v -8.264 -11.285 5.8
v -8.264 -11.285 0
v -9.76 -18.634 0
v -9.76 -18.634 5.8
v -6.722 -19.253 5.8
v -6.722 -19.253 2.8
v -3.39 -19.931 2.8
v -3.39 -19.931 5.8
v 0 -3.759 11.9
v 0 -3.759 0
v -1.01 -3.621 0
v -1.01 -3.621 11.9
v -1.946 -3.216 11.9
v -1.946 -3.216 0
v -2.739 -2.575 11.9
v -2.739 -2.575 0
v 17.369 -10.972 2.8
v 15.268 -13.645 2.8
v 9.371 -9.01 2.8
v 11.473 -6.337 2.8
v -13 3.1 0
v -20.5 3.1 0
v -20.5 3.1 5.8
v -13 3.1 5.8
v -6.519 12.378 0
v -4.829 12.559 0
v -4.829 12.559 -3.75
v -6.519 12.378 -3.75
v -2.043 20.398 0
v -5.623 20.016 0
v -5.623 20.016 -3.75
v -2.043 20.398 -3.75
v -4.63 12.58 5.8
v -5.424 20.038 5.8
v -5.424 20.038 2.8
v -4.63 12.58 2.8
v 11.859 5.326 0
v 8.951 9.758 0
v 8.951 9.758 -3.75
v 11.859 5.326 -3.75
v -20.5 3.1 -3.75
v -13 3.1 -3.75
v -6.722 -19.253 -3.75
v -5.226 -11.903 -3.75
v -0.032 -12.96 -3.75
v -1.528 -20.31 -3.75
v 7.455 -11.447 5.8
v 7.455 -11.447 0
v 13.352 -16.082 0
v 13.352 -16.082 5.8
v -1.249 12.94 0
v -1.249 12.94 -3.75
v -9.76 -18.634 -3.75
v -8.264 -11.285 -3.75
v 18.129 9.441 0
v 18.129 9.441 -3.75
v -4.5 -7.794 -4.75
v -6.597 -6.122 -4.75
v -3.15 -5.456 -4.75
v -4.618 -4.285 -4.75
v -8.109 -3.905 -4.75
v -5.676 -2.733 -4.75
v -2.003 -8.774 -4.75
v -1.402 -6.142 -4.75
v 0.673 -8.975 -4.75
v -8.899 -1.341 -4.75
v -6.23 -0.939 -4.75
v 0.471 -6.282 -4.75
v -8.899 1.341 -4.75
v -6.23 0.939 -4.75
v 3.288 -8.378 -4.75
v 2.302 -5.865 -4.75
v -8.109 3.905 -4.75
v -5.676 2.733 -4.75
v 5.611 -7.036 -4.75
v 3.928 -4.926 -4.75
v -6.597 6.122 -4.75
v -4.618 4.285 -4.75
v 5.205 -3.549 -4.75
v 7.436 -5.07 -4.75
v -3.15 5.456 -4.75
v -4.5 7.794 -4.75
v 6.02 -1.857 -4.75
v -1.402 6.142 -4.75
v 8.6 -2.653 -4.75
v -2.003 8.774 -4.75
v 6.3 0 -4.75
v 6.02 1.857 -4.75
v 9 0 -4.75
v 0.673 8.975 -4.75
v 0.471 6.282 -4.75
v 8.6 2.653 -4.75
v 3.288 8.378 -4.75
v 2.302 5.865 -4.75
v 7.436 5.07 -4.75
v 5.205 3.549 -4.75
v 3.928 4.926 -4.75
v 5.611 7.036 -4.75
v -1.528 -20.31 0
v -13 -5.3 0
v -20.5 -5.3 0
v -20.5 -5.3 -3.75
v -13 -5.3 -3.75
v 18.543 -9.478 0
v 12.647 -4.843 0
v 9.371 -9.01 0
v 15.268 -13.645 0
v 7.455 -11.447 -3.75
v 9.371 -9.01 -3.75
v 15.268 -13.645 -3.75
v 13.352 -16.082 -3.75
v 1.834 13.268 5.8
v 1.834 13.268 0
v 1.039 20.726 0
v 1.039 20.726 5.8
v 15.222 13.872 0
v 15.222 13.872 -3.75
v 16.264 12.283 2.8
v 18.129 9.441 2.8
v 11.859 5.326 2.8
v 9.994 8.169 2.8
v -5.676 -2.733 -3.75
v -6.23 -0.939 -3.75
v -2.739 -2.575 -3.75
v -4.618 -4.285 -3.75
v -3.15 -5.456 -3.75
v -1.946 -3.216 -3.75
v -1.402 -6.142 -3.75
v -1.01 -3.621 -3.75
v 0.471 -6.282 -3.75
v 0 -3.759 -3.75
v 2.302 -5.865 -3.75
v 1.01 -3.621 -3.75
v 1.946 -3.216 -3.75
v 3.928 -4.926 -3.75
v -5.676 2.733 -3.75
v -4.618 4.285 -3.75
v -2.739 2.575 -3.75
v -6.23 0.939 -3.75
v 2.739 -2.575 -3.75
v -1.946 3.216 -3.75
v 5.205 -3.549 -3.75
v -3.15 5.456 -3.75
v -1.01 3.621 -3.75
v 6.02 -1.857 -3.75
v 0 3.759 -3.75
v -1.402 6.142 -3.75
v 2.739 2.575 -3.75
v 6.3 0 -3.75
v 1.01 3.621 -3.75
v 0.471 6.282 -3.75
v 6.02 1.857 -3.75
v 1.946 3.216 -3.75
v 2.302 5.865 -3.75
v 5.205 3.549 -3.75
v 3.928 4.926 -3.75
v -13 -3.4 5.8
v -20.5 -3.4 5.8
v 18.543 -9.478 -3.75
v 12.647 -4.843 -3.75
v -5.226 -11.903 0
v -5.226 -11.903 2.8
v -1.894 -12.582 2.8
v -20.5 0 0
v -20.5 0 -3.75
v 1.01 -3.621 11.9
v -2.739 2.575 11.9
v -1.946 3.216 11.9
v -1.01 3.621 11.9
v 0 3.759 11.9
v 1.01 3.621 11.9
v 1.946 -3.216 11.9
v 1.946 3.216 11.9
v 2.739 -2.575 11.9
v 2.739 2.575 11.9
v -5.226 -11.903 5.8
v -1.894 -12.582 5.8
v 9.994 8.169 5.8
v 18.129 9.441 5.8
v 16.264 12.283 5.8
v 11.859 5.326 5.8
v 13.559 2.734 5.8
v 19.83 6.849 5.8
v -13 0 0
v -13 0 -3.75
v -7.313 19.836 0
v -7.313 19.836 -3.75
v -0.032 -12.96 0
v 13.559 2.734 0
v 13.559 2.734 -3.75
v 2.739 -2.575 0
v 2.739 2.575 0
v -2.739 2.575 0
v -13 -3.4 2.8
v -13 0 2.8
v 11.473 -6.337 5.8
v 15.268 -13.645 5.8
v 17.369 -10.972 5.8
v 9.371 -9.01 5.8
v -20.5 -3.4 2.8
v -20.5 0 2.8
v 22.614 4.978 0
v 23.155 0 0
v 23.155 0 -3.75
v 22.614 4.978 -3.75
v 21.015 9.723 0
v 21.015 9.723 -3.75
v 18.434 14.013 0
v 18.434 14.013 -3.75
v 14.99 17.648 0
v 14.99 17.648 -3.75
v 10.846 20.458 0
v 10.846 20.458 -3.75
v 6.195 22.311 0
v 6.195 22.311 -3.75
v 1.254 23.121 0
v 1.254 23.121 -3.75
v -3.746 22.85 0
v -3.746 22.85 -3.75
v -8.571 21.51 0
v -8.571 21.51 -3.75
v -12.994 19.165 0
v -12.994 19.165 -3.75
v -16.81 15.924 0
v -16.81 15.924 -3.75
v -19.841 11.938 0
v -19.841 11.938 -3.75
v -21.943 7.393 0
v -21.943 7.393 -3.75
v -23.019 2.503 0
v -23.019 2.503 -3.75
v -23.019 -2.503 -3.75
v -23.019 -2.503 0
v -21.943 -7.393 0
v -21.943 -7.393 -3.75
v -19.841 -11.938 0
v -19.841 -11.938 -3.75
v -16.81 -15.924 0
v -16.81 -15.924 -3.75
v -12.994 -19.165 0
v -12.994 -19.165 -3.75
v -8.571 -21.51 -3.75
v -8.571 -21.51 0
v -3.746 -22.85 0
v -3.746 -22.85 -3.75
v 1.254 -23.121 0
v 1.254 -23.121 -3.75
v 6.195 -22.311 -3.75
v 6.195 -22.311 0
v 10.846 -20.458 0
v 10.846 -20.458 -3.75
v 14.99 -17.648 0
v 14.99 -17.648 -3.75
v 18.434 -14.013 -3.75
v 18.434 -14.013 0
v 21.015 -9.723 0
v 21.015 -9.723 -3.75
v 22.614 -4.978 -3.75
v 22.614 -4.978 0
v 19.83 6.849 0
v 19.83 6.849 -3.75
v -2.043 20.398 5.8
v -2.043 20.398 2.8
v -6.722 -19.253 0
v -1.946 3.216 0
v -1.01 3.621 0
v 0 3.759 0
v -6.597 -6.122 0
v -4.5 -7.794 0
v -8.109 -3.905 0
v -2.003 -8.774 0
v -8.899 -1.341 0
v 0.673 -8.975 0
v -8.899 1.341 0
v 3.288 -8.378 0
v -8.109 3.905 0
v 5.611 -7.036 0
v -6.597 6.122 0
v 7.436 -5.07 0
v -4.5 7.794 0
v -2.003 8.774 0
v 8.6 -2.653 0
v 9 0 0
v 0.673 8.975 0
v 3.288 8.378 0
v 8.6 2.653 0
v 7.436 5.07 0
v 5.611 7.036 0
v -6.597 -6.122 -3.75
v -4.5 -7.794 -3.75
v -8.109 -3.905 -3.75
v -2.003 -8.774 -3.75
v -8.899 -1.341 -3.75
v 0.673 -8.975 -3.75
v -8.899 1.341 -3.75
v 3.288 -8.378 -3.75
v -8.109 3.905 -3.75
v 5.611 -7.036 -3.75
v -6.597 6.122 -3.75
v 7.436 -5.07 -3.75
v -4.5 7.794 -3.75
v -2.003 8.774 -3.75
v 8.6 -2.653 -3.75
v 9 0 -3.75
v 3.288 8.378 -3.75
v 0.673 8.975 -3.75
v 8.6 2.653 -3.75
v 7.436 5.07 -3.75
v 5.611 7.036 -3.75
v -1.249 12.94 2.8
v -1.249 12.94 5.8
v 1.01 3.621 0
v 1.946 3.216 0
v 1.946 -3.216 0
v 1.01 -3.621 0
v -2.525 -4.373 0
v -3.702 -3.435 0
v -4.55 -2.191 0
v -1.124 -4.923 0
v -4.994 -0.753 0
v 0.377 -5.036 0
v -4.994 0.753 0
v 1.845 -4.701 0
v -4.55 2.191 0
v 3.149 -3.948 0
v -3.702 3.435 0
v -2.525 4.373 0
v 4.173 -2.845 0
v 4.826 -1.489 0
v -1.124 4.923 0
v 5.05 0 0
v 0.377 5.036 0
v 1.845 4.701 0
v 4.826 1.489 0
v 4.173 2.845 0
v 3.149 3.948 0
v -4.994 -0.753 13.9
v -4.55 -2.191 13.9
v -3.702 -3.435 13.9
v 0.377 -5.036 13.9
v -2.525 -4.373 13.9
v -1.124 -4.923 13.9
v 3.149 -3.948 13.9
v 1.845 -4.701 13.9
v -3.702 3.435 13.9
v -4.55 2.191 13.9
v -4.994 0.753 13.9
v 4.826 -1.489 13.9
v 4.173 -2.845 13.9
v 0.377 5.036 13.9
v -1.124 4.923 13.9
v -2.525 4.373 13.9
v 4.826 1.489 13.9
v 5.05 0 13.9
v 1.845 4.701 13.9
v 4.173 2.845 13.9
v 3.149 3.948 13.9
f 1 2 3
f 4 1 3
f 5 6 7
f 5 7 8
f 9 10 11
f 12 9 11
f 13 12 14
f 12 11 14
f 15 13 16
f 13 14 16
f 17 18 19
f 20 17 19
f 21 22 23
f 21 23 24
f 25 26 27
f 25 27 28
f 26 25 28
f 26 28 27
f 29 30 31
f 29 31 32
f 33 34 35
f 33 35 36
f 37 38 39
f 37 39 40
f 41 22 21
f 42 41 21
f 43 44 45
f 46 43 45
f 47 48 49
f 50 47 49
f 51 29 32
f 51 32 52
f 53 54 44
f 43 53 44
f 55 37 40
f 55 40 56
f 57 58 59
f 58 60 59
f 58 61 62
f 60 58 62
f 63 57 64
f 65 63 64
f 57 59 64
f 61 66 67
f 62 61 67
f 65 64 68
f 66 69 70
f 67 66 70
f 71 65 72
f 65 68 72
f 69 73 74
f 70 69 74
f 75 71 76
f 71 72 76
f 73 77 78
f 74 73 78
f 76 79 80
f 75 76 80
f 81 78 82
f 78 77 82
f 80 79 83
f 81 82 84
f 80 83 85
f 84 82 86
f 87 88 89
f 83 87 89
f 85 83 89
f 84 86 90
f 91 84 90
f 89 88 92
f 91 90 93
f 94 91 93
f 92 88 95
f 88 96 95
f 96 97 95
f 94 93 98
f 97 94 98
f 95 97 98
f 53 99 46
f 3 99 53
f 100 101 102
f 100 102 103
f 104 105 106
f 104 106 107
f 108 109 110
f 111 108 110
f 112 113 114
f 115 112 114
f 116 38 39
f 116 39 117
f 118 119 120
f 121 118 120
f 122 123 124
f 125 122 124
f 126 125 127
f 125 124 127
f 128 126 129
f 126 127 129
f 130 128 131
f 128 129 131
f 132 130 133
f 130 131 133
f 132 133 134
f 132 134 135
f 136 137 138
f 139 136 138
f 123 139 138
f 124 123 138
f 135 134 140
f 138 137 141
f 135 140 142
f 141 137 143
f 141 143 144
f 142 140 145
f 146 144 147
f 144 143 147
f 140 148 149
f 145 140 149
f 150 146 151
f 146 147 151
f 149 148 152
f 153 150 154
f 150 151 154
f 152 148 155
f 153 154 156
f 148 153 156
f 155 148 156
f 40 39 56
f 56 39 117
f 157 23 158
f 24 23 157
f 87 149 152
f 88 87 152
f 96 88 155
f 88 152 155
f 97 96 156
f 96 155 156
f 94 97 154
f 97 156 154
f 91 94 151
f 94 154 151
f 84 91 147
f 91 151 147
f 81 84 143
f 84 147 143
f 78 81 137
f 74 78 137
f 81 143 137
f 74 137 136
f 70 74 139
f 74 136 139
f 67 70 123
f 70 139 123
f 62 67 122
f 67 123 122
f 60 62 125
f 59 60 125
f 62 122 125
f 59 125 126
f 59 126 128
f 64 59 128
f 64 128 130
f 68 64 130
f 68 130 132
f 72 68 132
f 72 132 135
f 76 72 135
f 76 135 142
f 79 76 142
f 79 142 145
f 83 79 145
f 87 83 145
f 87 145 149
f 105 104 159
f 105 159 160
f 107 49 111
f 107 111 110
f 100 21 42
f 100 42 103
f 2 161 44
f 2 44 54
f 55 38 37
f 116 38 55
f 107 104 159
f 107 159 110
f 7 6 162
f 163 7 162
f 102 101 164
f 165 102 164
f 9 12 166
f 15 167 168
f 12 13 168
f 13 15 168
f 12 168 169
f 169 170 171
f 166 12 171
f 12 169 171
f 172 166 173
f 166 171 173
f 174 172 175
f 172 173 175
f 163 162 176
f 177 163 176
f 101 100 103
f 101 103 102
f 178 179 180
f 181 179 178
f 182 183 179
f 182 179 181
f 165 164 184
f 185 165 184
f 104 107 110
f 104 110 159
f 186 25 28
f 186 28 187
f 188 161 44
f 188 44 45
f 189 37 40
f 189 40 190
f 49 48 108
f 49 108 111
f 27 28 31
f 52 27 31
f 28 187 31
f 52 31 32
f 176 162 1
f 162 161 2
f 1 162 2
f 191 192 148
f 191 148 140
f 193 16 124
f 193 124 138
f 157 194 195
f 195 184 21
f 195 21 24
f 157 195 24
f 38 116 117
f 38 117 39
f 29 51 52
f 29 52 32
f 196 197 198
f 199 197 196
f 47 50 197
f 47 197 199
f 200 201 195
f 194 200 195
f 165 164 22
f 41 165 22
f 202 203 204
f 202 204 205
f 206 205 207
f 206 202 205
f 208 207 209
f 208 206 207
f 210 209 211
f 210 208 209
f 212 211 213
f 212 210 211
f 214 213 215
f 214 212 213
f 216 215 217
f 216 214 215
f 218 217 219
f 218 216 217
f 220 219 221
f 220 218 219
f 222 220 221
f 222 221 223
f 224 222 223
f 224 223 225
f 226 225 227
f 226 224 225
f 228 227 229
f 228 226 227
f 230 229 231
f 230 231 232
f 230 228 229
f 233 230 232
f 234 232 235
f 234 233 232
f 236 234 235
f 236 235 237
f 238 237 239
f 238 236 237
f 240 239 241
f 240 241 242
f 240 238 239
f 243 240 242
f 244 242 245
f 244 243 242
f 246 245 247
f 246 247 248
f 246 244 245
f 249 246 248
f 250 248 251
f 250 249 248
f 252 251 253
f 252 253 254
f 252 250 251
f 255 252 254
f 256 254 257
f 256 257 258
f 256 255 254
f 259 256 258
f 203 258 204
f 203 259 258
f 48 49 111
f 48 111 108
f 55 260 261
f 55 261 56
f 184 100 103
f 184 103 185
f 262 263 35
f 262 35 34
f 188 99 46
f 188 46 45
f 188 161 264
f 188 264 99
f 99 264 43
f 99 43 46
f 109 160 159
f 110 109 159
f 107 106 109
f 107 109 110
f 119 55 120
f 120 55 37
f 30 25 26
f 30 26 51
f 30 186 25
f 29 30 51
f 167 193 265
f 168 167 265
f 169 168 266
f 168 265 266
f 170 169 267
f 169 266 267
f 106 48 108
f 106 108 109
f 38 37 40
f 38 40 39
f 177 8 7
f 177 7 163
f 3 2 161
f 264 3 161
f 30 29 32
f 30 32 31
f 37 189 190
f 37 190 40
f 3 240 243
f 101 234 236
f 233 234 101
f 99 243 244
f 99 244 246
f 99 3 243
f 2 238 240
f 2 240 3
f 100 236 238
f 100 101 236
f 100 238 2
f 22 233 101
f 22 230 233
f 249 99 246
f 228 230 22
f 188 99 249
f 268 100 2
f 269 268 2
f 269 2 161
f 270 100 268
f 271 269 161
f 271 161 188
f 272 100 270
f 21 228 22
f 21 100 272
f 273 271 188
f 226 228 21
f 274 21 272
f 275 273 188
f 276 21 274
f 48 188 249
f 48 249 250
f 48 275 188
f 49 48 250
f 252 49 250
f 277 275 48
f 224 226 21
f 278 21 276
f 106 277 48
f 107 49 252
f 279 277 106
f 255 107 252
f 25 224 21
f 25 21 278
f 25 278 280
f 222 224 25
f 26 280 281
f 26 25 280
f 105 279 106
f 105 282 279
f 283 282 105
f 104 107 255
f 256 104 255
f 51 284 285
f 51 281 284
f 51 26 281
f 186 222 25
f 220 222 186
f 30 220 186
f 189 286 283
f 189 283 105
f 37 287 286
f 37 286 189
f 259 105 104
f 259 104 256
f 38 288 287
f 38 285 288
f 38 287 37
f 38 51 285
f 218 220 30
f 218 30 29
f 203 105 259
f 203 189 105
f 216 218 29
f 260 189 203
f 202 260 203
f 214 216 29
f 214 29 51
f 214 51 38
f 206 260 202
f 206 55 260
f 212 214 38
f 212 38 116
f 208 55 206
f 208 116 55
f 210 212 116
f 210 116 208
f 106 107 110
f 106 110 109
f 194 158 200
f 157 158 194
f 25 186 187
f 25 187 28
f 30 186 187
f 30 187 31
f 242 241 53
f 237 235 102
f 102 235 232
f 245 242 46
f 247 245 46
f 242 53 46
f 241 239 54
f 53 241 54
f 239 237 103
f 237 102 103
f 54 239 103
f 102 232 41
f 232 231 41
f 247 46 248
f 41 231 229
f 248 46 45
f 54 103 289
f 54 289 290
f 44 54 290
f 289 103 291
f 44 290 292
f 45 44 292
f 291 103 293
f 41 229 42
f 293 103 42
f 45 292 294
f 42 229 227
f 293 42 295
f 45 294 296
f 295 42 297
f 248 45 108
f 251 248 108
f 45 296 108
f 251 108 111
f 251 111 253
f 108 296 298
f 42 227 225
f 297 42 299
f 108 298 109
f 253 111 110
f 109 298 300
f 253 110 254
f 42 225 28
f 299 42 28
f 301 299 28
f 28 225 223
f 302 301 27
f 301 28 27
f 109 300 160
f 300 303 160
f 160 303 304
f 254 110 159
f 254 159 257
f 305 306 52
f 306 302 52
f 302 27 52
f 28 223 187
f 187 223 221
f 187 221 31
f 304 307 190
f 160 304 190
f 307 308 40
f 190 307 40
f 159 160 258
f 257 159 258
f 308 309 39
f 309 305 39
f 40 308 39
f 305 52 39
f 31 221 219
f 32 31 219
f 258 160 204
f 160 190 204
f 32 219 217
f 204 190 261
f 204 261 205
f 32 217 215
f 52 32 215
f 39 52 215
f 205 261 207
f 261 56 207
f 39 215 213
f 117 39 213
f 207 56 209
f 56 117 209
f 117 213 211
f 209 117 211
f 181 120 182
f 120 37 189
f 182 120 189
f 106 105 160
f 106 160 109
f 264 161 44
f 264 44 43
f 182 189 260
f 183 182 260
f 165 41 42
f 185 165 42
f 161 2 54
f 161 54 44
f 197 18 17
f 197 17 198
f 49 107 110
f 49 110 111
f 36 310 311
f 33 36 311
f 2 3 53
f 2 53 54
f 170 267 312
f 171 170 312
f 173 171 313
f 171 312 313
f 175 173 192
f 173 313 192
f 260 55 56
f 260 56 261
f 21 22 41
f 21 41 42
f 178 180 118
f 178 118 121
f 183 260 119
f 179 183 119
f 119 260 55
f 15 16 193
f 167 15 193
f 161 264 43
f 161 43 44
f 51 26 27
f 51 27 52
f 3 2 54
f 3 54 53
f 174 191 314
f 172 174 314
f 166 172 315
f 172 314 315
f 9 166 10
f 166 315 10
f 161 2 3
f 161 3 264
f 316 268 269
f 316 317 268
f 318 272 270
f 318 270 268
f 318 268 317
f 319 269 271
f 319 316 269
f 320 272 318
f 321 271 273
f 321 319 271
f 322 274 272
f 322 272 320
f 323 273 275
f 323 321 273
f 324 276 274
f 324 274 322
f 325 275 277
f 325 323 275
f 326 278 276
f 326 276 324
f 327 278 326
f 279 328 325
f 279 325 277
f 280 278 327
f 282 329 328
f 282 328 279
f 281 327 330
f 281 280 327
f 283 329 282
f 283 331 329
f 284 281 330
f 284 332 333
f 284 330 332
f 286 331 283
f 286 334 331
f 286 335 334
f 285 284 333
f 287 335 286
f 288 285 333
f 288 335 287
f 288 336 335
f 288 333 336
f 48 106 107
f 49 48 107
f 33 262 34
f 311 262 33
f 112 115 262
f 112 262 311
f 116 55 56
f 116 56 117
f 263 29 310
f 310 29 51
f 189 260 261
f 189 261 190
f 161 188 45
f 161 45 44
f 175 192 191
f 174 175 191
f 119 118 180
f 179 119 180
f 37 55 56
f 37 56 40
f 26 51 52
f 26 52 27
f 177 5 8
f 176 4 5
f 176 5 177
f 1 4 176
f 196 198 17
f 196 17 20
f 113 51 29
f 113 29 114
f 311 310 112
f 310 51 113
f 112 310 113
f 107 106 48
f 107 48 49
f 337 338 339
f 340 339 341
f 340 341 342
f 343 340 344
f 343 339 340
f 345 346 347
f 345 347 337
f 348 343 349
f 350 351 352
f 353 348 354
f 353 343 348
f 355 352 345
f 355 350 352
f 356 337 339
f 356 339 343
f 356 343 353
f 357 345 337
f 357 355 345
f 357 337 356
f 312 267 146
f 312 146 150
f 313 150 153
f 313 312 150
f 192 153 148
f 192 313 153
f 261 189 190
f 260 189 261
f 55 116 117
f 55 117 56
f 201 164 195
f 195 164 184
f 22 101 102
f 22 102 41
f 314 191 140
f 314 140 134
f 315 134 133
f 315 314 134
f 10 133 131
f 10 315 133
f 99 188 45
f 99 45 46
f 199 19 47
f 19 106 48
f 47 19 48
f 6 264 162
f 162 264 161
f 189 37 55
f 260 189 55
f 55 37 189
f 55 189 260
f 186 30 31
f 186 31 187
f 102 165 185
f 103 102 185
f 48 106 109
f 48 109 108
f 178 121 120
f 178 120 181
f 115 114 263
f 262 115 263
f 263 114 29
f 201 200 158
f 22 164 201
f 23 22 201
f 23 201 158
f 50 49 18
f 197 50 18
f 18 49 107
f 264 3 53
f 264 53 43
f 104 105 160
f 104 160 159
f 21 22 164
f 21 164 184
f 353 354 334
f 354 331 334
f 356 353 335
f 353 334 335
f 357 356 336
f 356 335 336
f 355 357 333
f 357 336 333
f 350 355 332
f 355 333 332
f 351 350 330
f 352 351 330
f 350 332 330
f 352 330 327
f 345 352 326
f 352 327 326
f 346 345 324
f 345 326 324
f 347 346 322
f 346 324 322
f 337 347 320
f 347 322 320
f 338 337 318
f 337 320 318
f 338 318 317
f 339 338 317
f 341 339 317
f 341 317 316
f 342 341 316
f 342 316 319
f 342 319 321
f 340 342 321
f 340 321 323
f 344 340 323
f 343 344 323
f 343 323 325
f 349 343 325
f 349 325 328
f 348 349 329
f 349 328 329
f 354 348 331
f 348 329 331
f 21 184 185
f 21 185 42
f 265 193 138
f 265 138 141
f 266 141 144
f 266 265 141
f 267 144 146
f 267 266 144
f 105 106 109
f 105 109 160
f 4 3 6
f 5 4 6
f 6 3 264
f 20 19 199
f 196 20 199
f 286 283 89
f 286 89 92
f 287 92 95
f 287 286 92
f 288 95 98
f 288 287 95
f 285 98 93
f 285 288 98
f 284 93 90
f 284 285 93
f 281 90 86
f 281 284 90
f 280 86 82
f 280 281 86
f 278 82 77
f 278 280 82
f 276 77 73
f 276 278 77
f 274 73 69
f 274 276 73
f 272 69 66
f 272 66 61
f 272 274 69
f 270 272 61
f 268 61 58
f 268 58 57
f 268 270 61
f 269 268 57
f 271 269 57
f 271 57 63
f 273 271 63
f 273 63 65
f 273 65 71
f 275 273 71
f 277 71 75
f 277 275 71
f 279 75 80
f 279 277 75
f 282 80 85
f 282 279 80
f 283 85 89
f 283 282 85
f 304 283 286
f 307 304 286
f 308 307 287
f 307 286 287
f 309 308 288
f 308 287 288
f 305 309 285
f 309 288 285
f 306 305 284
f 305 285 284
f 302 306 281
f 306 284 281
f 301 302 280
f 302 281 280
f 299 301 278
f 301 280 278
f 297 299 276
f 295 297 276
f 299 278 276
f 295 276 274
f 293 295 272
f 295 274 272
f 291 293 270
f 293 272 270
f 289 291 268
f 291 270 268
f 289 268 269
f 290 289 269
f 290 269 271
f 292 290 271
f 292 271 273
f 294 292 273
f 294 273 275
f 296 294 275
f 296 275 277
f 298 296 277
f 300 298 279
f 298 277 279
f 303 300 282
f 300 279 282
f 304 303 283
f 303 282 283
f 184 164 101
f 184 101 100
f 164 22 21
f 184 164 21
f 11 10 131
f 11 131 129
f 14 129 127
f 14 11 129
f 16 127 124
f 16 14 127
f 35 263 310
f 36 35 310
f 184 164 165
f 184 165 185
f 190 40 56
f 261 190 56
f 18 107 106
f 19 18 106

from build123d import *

# Parameters (mm, degrees)
F0_R      = 23.155
F0_R_2    = 9
F1_DEPTH  = 3.75
F0_R_3    = 6.3
F2_DEPTH  = 4.75
F3_DEPTH  = 5.8
F4_DEPTH  = 3.75
F5_W      = 7.5
F5_H      = 3
F6_DEPTH  = 3.4
F0_W      = 7.5
F0_H      = 3.1
F7_DEPTH  = 5.8
F8_W      = 7.5
F8_H      = 3
F9_DEPTH  = 3.4
F10_W     = 7.5
F10_H     = 3
F11_DEPTH = 3.4
F12_DEPTH = 3.75
F13_W     = 7.5
F13_H     = 3
F14_DEPTH = 3.4
F15_W     = 7.5
F15_H     = 3
F16_DEPTH = 3.4
F0_R_4    = 5.05
F17_DEPTH = 3.75
F18_DEPTH = 3.75
F19_DEPTH = 11.9
F20_R     = 5.05
F21_DEPTH = 2
F22_DEPTH = 3.75
F0_H_2    = 5.3


with BuildPart() as f1:
    # F0 (on Top) → F1 (new body)
    with BuildSketch(Plane.XY):
        Circle(F0_R)
        Polygon((-8.2636521274, -11.2850000563), (-5.2259463077, -11.9033392453), (-0.032449261, -12.9604997943), (-1.5284311699, -20.3097880678), (-6.7219282165, -19.2526275189), (-9.7596340363, -18.6342883299), align=None, mode=Mode.SUBTRACT)
        Polygon((-13, 3.1), (-13, 0), (-13, -5.3), (-20.5, -5.3), (-20.5, 0), (-20.5, 3.1), align=None, mode=Mode.SUBTRACT)
        Polygon((7.4554983603, -11.4469093574), (9.3713907755, -9.0098299058), (12.6469487758, -4.8432101983), (18.5431087392, -9.4784337836), (15.267550739, -13.6450534911), (13.3516583238, -16.0821329427), align=None, mode=Mode.SUBTRACT)
        Polygon((1.8337635187, 13.2682430609), (-1.2487967823, 12.9398804707), (-4.8285442287, 12.5585561724), (-6.5189805228, 12.3784863649), (-7.3134061442, 19.8362935448), (-5.6229698501, 20.0163633523), (-2.0432224037, 20.3976876506), (1.0393378973, 20.7260502408), align=None, mode=Mode.SUBTRACT)
        Circle(F0_R_2, mode=Mode.SUBTRACT)
        Polygon((13.5594344097, 2.734427086), (11.8587776603, 5.3262925571), (8.9512032177, 9.7575464271), (15.2218454866, 13.8720385629), (18.1294199292, 9.4407846929), (19.8300766787, 6.8489192217), align=None, mode=Mode.SUBTRACT)
    extrude(amount=-F1_DEPTH)

    # F0 (on Top) → F4 (join)
    with BuildSketch(Plane.XY):
        Polygon((-2.0432224037, 20.3976876506), (-1.2487967823, 12.9398804707), (1.8337635187, 13.2682430609), (1.0393378973, 20.7260502408), align=None)
    extrude(amount=-F4_DEPTH)


with BuildPart() as f2:
    # F0 (on Top) → F2 (new body)
    with BuildSketch(Plane.XY):
        Circle(F0_R_2)
        Circle(F0_R_3, mode=Mode.SUBTRACT)
    extrude(amount=-F2_DEPTH)

    # F0 (on Top) → F17 (join)
    with BuildSketch(Plane.XY):
        Circle(F0_R_3)
        Circle(F0_R_4, mode=Mode.SUBTRACT)
    extrude(amount=-F17_DEPTH)

    # F0 (on Top) → F18 (join)
    with BuildSketch(Plane.XY):
        Circle(F0_R_4)
        with BuildLine():
            Line((2.7389110228, 2.575), (2.7389110228, -2.575))
            ThreePointArc((2.7389110228, -2.575), (1.491993259, -3.4505383211), (0, -3.7592896391))
            ThreePointArc((0, -3.7592896391), (-1.491993259, -3.4505383211), (-2.7389110228, -2.575))
            Line((-2.7389110228, -2.575), (-2.7389110228, 2.575))
            ThreePointArc((-2.7389110228, 2.575), (-1.491993259, 3.4505383211), (0, 3.7592896391))
            ThreePointArc((0, 3.7592896391), (1.491993259, 3.4505383211), (2.7389110228, 2.575))
        make_face(mode=Mode.SUBTRACT)
    extrude(amount=-F18_DEPTH)

    # F0 (on Top) → F19 (join)
    with BuildSketch(Plane.XY):
        Circle(F0_R_4)
        with BuildLine():
            Line((2.7389110228, 2.575), (2.7389110228, -2.575))
            ThreePointArc((2.7389110228, -2.575), (1.491993259, -3.4505383211), (0, -3.7592896391))
            ThreePointArc((0, -3.7592896391), (-1.491993259, -3.4505383211), (-2.7389110228, -2.575))
            Line((-2.7389110228, -2.575), (-2.7389110228, 2.575))
            ThreePointArc((-2.7389110228, 2.575), (-1.491993259, 3.4505383211), (0, 3.7592896391))
            ThreePointArc((0, 3.7592896391), (1.491993259, 3.4505383211), (2.7389110228, 2.575))
        make_face(mode=Mode.SUBTRACT)
    extrude(amount=F19_DEPTH)

    # F20 (on face) → F21 (join)
    with BuildSketch(Plane.XY.offset(11.9)):
        Circle(F20_R)
        with BuildLine():
            Line((-2.7389110228, -2.575), (-2.7389110228, 2.575))
            ThreePointArc((-2.7389110228, 2.575), (0, 3.7592896391), (2.7389110228, 2.575))
            Line((2.7389110228, 2.575), (2.7389110228, -2.575))
            ThreePointArc((2.7389110228, -2.575), (0, -3.7592896391), (-2.7389110228, -2.575))
        make_face(mode=Mode.SUBTRACT)
        with BuildLine():
            ThreePointArc((2.7389110228, 2.575), (0, 3.7592896391), (-2.7389110228, 2.575))
            Line((-2.7389110228, 2.575), (-2.7389110228, -2.575))
            ThreePointArc((-2.7389110228, -2.575), (0, -3.7592896391), (2.7389110228, -2.575))
            Line((2.7389110228, -2.575), (2.7389110228, 2.575))
        make_face()
    extrude(amount=F21_DEPTH)


with BuildPart() as f3:
    # F0 (on Top) → F3 (new body)
    with BuildSketch(Plane.XY):
        Polygon((-2.0432224037, 20.3976876506), (-1.2487967823, 12.9398804707), (1.8337635187, 13.2682430609), (1.0393378973, 20.7260502408), align=None)
    extrude(amount=F3_DEPTH)

    # F5 (on face) → F6 (join)
    with BuildSketch(Plane(origin=(0.1281399733, 0.0136498136, 0), x_dir=(0.1059234162, -0.9943742906, 0), z_dir=(-0.9943742906, -0.1059234162, 0))):
        with Locations((-16.7493612855, 4.3)):
            Rectangle(F5_W, F5_H)
    extrude(amount=F6_DEPTH)


with BuildPart() as f7:
    # F0 (on Top) → F7 (new body)
    with BuildSketch(Plane.XY):
        with Locations((-16.75, 1.55)):
            Rectangle(F0_W, F0_H)
    extrude(amount=F7_DEPTH)

    # F8 (on face) → F9 (join)
    with BuildSketch(Plane.XZ):
        with Locations((-16.75, 4.3)):
            Rectangle(F8_W, F8_H)
    extrude(amount=F9_DEPTH)


with BuildPart() as f7b:
    # F0 (on Top) → F7, piece 2 (new body)
    with BuildSketch(Plane.XY):
        Polygon((18.1294199292, 9.4407846929), (11.8587776603, 5.3262925571), (13.5594344097, 2.734427086), (19.8300766787, 6.8489192217), align=None)
    extrude(amount=F7_DEPTH)

    # F15 (on face) → F16 (join)
    with BuildSketch(Plane(origin=(1.1259863408, -1.7160459443, 0), x_dir=(-0.8360856359, -0.5485989514, 0), z_dir=(-0.5485989514, 0.8360856359, 0))):
        with Locations((-16.5869521724, 4.3)):
            Rectangle(F15_W, F15_H)
    extrude(amount=F16_DEPTH)


with BuildPart() as f7c:
    # F0 (on Top) → F7, piece 3 (new body)
    with BuildSketch(Plane.XY):
        Polygon((15.267550739, -13.6450534911), (9.3713907755, -9.0098299058), (7.4554983603, -11.4469093574), (13.3516583238, -16.0821329427), align=None)
    extrude(amount=F7_DEPTH)

    # F13 (on face) → F14 (join)
    with BuildSketch(Plane(origin=(-0.7980748179, -1.0151779526, 0), x_dir=(-0.7861546618, 0.6180298114, 0), z_dir=(0.6180298114, 0.7861546618, 0))):
        with Locations((-16.6857060228, 4.3)):
            Rectangle(F13_W, F13_H)
    extrude(amount=F14_DEPTH)


with BuildPart() as f7d:
    # F0 (on Top) → F7, piece 4 (new body)
    with BuildSketch(Plane.XY):
        Polygon((-6.7219282165, -19.2526275189), (-5.2259463077, -11.9033392453), (-8.2636521274, -11.2850000563), (-9.7596340363, -18.6342883299), align=None)
    extrude(amount=F7_DEPTH)

    # F10 (on face) → F11 (join)
    with BuildSketch(Plane(origin=(-2.6914473039, 0.547856653, 0), x_dir=(0.1994642545, 0.9799051031, 0), z_dir=(0.9799051031, -0.1994642545, 0))):
        with Locations((-16.4565323554, 4.3)):
            Rectangle(F10_W, F10_H)
    extrude(amount=F11_DEPTH)


with BuildPart() as f12:
    # F0 (on Top) → F12 (new body)
    with BuildSketch(Plane.XY):
        with Locations((-16.75, 1.55)):
            Rectangle(F0_W, F0_H)
    extrude(amount=-F12_DEPTH)


with BuildPart() as f12b:
    # F0 (on Top) → F12, piece 2 (new body)
    with BuildSketch(Plane.XY):
        Polygon((-6.7219282165, -19.2526275189), (-5.2259463077, -11.9033392453), (-8.2636521274, -11.2850000563), (-9.7596340363, -18.6342883299), align=None)
    extrude(amount=-F12_DEPTH)


with BuildPart() as f12c:
    # F0 (on Top) → F12, piece 3 (new body)
    with BuildSketch(Plane.XY):
        Polygon((18.1294199292, 9.4407846929), (11.8587776603, 5.3262925571), (13.5594344097, 2.734427086), (19.8300766787, 6.8489192217), align=None)
    extrude(amount=-F12_DEPTH)


with BuildPart() as f12d:
    # F0 (on Top) → F12, piece 4 (new body)
    with BuildSketch(Plane.XY):
        Polygon((15.267550739, -13.6450534911), (9.3713907755, -9.0098299058), (7.4554983603, -11.4469093574), (13.3516583238, -16.0821329427), align=None)
    extrude(amount=-F12_DEPTH)


with BuildPart() as f22:
    # F0 (on Top) → F22 (new body)
    with BuildSketch(Plane.XY):
        Polygon((-6.5189805228, 12.3784863649), (-4.8285442287, 12.5585561724), (-5.6229698501, 20.0163633523), (-7.3134061442, 19.8362935448), align=None)
        Polygon((-4.8285442287, 12.5585561724), (-1.2487967823, 12.9398804707), (-2.0432224037, 20.3976876506), (-5.6229698501, 20.0163633523), align=None)
    extrude(amount=-F22_DEPTH)


with BuildPart() as f22b:
    # F0 (on Top) → F22, piece 2 (new body)
    with BuildSketch(Plane.XY):
        with Locations((-16.75, -2.65)):
            Rectangle(F0_W, F0_H_2)
    extrude(amount=-F22_DEPTH)


with BuildPart() as f22c:
    # F0 (on Top) → F22, piece 3 (new body)
    with BuildSketch(Plane.XY):
        Polygon((-0.032449261, -12.9604997943), (-5.2259463077, -11.9033392453), (-6.7219282165, -19.2526275189), (-1.5284311699, -20.3097880678), align=None)
    extrude(amount=-F22_DEPTH)


with BuildPart() as f22d:
    # F0 (on Top) → F22, piece 4 (new body)
    with BuildSketch(Plane.XY):
        Polygon((12.6469487758, -4.8432101983), (9.3713907755, -9.0098299058), (15.267550739, -13.6450534911), (18.5431087392, -9.4784337836), align=None)
    extrude(amount=-F22_DEPTH)


with BuildPart() as f22e:
    # F0 (on Top) → F22, piece 5 (new body)
    with BuildSketch(Plane.XY):
        Polygon((8.9512032177, 9.7575464271), (11.8587776603, 5.3262925571), (18.1294199292, 9.4407846929), (15.2218454866, 13.8720385629), align=None)
    extrude(amount=-F22_DEPTH)


solid = Compound([f1.part, f2.part, f3.part, f7.part, f7b.part, f7c.part, f7d.part, f12.part, f12b.part, f12c.part, f12d.part, f22.part, f22b.part, f22c.part, f22d.part, f22e.part])
